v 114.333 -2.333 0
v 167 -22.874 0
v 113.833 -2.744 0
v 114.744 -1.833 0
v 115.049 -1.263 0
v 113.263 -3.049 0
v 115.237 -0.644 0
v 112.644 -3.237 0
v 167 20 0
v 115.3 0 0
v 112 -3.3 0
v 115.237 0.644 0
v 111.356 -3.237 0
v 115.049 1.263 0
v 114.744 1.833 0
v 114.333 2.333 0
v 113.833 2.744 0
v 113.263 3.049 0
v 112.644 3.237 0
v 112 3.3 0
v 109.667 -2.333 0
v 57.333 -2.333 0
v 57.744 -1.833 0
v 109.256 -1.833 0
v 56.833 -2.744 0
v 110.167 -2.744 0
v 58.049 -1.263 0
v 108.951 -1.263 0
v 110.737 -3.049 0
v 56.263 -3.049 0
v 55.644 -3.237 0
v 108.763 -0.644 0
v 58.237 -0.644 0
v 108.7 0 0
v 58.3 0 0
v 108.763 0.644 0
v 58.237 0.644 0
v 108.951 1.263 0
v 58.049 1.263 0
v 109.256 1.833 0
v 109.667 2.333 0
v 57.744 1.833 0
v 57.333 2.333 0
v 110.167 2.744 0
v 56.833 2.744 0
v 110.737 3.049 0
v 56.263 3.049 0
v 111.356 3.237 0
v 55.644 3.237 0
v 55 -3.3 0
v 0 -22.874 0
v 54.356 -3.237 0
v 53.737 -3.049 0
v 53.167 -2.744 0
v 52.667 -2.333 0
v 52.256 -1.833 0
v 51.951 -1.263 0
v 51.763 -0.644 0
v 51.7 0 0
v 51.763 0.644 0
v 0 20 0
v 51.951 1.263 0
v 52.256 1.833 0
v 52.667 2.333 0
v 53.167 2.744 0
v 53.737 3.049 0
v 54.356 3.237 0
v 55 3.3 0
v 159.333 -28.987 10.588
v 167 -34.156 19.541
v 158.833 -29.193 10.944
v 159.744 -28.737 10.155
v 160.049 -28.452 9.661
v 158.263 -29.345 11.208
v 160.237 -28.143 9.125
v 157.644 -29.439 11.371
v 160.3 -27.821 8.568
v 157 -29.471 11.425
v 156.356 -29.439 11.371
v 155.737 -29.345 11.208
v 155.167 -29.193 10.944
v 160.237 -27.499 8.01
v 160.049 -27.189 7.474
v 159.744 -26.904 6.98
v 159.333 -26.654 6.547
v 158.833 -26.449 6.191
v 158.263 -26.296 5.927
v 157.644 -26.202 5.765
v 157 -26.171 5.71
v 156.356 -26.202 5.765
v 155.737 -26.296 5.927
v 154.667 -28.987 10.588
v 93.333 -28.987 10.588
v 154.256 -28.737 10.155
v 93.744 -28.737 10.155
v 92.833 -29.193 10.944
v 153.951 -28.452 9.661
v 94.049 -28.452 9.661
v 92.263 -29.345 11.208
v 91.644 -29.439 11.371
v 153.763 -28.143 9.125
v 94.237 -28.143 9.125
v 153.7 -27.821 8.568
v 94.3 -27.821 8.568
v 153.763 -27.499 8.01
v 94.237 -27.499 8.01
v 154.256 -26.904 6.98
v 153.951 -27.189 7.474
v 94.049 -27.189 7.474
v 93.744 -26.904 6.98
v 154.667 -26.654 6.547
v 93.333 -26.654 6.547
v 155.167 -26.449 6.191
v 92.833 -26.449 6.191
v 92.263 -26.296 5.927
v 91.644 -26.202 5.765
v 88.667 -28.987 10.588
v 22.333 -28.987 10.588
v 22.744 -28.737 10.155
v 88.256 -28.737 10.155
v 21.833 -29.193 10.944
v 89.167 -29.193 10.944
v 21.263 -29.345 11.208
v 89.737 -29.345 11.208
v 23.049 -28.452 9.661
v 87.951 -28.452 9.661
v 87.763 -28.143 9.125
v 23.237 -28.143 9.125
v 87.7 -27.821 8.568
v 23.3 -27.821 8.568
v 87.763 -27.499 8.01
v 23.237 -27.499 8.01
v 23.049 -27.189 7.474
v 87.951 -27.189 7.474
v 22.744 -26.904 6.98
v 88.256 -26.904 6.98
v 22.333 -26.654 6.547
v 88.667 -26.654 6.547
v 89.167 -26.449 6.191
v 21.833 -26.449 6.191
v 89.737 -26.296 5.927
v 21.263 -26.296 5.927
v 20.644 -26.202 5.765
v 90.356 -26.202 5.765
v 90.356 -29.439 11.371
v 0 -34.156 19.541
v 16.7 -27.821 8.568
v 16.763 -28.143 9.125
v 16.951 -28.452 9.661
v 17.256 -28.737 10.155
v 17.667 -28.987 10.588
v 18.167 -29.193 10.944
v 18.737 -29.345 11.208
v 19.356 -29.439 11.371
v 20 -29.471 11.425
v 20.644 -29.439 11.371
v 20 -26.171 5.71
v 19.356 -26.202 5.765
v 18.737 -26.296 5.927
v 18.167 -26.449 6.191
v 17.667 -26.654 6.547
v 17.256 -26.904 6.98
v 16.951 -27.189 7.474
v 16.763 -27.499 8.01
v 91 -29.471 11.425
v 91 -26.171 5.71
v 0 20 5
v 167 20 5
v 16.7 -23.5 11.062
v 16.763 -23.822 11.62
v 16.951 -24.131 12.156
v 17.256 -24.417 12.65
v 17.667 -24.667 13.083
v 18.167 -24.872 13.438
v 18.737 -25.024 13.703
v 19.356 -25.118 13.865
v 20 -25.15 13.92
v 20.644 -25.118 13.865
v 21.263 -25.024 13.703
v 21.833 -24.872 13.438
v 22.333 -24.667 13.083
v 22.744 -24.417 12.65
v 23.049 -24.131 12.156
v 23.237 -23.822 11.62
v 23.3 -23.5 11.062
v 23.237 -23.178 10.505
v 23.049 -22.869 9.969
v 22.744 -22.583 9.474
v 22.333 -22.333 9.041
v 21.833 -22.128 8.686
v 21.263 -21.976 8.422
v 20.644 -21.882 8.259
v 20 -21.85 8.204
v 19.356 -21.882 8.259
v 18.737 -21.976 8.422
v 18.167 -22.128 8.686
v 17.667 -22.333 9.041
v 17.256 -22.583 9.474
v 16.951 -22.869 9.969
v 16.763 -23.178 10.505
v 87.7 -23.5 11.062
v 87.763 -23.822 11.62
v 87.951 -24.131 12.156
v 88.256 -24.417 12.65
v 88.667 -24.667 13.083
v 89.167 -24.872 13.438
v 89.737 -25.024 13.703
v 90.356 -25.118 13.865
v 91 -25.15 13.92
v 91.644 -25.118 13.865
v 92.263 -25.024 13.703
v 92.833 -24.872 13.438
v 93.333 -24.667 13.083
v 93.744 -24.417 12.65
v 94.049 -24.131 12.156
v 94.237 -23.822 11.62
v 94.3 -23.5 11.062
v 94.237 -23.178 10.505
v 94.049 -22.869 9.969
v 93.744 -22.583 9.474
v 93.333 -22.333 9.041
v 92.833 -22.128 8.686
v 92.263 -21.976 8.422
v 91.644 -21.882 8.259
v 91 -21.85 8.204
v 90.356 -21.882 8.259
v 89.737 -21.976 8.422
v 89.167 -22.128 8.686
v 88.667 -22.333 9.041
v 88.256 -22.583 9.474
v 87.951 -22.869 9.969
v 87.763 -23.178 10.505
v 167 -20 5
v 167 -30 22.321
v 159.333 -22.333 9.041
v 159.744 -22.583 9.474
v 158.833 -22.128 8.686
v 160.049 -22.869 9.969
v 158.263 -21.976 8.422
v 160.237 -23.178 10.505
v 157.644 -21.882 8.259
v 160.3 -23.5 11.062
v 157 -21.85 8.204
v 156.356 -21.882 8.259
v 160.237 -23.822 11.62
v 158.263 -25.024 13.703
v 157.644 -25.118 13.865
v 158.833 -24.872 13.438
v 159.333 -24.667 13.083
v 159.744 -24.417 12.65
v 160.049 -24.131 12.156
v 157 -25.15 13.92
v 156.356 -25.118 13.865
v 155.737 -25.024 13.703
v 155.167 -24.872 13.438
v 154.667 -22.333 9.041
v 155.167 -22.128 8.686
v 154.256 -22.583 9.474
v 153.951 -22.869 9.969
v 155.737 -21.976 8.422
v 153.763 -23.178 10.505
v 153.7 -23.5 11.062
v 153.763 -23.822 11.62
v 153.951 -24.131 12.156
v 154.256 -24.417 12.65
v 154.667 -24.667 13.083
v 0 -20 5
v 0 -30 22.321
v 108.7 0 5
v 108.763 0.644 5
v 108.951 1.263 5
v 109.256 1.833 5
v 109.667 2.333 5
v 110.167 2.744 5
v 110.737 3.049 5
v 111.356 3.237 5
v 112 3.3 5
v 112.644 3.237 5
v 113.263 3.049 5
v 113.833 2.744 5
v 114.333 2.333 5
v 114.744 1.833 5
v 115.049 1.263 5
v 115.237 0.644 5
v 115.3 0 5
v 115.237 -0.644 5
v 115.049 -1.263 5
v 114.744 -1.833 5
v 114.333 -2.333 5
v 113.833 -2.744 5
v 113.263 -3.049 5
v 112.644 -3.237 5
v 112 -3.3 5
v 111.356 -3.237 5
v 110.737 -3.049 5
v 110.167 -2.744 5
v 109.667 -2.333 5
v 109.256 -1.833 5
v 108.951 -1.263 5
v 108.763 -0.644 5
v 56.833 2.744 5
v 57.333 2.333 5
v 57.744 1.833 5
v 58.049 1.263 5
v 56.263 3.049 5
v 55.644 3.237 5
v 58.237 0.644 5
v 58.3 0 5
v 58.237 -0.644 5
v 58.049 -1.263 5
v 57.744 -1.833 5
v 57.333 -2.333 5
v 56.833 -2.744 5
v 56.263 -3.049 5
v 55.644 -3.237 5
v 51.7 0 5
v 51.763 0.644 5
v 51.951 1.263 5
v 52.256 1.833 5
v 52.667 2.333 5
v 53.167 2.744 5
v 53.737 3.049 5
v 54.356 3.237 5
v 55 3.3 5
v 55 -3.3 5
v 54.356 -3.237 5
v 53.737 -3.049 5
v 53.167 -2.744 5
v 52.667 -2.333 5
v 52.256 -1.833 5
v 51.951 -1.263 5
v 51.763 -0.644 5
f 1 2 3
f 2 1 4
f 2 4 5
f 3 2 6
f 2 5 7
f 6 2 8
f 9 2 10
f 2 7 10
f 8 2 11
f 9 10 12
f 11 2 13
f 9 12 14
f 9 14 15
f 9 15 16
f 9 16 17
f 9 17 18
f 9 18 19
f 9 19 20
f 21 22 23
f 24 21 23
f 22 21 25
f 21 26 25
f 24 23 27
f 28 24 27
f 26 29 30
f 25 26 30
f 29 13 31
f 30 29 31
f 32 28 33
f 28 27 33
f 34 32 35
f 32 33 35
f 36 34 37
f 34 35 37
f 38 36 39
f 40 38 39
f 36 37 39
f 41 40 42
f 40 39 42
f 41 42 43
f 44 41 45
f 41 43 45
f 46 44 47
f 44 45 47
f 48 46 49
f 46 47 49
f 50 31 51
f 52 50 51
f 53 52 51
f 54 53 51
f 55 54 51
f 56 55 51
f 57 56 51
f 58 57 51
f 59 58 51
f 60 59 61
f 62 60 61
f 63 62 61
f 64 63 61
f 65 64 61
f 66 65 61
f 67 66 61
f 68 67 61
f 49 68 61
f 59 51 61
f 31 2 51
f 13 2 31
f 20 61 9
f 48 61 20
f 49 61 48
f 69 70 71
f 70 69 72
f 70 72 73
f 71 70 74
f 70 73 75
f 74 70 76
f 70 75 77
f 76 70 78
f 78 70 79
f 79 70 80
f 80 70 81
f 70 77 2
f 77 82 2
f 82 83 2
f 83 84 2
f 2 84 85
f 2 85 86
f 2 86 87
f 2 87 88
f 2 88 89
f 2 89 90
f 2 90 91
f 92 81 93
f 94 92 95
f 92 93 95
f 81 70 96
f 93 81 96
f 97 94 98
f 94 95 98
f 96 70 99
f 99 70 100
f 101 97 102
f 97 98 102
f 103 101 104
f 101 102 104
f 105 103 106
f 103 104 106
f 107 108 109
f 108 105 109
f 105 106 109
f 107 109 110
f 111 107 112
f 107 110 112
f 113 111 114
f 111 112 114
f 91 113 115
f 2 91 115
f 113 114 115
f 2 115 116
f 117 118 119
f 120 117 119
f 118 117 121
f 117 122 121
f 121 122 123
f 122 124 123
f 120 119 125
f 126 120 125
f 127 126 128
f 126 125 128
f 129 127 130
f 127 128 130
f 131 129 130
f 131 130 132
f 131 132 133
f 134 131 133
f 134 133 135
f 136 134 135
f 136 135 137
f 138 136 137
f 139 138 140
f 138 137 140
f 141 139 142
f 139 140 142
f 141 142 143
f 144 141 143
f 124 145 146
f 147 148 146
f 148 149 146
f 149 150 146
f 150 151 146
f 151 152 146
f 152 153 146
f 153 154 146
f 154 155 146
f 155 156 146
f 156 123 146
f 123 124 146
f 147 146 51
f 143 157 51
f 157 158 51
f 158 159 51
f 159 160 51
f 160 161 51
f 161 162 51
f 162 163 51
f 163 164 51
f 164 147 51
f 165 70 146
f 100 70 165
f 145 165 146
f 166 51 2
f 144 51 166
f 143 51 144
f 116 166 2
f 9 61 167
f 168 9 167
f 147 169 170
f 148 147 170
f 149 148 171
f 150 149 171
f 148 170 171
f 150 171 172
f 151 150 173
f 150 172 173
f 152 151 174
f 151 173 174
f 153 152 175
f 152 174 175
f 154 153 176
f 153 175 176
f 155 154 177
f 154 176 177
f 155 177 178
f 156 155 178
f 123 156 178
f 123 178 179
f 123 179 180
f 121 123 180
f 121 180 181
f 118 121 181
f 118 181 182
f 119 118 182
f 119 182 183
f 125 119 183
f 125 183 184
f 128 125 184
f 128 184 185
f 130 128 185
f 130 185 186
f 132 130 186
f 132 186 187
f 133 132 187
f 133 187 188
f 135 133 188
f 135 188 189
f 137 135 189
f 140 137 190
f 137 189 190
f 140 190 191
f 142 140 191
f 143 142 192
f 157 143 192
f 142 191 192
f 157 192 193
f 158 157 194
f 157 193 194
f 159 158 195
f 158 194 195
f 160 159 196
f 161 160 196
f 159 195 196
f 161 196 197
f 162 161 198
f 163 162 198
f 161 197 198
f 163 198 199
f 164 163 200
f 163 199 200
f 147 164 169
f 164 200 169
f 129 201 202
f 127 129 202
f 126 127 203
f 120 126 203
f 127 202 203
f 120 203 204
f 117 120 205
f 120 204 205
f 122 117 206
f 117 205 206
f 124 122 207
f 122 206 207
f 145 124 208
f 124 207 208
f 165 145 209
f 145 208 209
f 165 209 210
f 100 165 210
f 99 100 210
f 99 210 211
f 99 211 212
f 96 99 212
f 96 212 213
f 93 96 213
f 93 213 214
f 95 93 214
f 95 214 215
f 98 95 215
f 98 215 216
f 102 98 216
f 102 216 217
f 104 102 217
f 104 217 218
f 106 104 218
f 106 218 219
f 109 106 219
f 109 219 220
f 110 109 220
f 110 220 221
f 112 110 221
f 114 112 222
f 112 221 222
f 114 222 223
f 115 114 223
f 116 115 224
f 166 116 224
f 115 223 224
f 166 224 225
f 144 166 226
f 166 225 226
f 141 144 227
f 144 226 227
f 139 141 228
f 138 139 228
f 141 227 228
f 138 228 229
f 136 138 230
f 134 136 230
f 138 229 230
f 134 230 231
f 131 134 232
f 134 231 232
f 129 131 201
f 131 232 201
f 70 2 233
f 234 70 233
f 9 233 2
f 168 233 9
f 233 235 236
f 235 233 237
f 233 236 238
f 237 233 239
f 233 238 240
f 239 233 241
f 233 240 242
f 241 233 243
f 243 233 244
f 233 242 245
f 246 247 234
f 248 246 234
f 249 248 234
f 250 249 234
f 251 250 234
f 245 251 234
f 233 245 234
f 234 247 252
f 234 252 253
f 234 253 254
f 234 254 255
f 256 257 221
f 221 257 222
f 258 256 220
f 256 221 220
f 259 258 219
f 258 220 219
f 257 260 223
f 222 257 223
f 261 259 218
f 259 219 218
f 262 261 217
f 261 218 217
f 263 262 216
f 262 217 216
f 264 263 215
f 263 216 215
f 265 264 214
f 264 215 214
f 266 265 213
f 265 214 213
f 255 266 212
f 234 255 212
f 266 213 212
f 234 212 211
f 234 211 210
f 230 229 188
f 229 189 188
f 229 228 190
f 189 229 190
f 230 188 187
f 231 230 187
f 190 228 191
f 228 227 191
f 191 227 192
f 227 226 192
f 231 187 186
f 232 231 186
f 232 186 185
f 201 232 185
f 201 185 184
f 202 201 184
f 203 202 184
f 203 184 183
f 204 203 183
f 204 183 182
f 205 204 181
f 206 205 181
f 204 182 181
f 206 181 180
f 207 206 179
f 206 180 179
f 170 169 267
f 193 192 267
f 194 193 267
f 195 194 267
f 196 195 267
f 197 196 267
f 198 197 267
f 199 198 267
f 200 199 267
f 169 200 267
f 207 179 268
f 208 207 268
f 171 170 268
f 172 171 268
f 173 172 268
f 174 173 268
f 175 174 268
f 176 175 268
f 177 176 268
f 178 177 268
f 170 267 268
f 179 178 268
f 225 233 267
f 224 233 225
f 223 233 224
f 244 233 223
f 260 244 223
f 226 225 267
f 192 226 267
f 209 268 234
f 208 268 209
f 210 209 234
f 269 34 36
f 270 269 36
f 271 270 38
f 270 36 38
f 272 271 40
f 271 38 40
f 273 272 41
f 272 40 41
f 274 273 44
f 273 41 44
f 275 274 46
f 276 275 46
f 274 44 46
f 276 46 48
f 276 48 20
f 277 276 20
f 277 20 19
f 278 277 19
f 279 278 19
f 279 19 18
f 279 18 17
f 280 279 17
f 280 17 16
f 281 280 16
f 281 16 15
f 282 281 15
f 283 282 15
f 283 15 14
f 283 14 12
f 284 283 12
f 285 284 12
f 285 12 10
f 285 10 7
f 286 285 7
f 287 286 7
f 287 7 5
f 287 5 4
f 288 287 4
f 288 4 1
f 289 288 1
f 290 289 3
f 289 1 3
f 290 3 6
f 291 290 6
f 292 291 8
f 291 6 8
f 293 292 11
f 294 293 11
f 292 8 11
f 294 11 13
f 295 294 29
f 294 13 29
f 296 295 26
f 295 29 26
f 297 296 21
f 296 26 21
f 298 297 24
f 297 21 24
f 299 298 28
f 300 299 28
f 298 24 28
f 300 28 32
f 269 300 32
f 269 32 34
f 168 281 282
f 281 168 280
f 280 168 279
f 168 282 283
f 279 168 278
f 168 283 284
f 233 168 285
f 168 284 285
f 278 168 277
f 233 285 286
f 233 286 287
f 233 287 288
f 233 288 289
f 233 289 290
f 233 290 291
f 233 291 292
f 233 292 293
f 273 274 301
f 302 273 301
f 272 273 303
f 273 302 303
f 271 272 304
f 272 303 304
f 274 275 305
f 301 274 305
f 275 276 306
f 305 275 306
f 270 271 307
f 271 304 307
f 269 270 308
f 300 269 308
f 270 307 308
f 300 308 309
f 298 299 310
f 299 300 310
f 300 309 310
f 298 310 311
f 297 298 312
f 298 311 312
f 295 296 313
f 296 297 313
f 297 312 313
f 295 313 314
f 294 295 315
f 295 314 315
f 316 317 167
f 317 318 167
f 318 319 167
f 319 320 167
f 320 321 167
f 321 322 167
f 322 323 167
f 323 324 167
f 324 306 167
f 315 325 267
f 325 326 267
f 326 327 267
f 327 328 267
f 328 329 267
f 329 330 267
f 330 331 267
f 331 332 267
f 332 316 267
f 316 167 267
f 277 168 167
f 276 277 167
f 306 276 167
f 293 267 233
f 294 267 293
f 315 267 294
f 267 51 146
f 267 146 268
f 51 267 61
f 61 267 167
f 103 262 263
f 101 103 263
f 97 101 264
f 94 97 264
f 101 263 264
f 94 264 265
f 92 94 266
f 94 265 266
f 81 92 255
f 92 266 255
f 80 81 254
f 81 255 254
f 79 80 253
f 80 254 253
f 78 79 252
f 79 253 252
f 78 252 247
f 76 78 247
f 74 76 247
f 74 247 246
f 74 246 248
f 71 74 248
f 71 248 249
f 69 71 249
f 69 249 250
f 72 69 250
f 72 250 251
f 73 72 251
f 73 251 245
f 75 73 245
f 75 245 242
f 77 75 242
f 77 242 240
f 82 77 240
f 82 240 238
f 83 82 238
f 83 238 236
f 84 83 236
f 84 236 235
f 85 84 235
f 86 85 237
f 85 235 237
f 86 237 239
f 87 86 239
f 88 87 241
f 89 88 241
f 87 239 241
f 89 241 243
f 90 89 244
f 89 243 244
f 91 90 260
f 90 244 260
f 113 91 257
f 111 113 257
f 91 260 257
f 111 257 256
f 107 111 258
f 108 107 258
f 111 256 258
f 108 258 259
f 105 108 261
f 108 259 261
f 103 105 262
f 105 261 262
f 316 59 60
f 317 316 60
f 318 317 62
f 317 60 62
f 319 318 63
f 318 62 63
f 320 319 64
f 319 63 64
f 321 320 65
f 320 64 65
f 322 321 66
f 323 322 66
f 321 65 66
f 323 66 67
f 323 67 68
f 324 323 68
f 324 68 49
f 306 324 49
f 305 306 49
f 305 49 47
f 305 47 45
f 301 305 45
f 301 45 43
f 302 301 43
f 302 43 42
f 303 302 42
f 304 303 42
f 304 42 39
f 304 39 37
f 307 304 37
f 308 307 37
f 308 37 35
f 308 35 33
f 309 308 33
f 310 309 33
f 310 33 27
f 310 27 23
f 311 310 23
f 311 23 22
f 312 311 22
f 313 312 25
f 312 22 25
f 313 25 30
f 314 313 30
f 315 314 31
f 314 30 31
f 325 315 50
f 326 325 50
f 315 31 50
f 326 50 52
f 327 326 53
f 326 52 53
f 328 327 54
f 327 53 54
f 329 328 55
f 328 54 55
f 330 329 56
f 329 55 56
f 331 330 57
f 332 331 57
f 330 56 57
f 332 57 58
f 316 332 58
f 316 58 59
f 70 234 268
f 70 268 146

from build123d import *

# Parameters (mm, degrees)
F1_DEPTH = 167
F3_D     = 6.6
F5_D     = 6.6


with BuildPart() as f1:
    # F0 (on Right) → F1 (new body)
    with BuildSketch(Plane.YZ):
        Polygon((-22.8742525516, 0), (20, 0), (20, 5), (-20, 5), (-30, 22.3205080757), (-34.1563406595, 19.5411498184), align=None)
    extrude(amount=F1_DEPTH)

    # F3 (through all)
    with Locations(Plane.XY.offset(5)):
        with Locations((112, 0), (55, 0)):
            Hole(F3_D / 2)

    # F5 (through all)
    with Locations(Plane(origin=(0, -17.1556894137, -9.9048419011), x_dir=(1, 0, 0), z_dir=(0, -0.8660254038, -0.5))):
        with Locations((20, 21.3301270189), (91, 21.3301270189), (157, 21.3301270189)):
            Hole(F5_D / 2)


solid = f1.part
